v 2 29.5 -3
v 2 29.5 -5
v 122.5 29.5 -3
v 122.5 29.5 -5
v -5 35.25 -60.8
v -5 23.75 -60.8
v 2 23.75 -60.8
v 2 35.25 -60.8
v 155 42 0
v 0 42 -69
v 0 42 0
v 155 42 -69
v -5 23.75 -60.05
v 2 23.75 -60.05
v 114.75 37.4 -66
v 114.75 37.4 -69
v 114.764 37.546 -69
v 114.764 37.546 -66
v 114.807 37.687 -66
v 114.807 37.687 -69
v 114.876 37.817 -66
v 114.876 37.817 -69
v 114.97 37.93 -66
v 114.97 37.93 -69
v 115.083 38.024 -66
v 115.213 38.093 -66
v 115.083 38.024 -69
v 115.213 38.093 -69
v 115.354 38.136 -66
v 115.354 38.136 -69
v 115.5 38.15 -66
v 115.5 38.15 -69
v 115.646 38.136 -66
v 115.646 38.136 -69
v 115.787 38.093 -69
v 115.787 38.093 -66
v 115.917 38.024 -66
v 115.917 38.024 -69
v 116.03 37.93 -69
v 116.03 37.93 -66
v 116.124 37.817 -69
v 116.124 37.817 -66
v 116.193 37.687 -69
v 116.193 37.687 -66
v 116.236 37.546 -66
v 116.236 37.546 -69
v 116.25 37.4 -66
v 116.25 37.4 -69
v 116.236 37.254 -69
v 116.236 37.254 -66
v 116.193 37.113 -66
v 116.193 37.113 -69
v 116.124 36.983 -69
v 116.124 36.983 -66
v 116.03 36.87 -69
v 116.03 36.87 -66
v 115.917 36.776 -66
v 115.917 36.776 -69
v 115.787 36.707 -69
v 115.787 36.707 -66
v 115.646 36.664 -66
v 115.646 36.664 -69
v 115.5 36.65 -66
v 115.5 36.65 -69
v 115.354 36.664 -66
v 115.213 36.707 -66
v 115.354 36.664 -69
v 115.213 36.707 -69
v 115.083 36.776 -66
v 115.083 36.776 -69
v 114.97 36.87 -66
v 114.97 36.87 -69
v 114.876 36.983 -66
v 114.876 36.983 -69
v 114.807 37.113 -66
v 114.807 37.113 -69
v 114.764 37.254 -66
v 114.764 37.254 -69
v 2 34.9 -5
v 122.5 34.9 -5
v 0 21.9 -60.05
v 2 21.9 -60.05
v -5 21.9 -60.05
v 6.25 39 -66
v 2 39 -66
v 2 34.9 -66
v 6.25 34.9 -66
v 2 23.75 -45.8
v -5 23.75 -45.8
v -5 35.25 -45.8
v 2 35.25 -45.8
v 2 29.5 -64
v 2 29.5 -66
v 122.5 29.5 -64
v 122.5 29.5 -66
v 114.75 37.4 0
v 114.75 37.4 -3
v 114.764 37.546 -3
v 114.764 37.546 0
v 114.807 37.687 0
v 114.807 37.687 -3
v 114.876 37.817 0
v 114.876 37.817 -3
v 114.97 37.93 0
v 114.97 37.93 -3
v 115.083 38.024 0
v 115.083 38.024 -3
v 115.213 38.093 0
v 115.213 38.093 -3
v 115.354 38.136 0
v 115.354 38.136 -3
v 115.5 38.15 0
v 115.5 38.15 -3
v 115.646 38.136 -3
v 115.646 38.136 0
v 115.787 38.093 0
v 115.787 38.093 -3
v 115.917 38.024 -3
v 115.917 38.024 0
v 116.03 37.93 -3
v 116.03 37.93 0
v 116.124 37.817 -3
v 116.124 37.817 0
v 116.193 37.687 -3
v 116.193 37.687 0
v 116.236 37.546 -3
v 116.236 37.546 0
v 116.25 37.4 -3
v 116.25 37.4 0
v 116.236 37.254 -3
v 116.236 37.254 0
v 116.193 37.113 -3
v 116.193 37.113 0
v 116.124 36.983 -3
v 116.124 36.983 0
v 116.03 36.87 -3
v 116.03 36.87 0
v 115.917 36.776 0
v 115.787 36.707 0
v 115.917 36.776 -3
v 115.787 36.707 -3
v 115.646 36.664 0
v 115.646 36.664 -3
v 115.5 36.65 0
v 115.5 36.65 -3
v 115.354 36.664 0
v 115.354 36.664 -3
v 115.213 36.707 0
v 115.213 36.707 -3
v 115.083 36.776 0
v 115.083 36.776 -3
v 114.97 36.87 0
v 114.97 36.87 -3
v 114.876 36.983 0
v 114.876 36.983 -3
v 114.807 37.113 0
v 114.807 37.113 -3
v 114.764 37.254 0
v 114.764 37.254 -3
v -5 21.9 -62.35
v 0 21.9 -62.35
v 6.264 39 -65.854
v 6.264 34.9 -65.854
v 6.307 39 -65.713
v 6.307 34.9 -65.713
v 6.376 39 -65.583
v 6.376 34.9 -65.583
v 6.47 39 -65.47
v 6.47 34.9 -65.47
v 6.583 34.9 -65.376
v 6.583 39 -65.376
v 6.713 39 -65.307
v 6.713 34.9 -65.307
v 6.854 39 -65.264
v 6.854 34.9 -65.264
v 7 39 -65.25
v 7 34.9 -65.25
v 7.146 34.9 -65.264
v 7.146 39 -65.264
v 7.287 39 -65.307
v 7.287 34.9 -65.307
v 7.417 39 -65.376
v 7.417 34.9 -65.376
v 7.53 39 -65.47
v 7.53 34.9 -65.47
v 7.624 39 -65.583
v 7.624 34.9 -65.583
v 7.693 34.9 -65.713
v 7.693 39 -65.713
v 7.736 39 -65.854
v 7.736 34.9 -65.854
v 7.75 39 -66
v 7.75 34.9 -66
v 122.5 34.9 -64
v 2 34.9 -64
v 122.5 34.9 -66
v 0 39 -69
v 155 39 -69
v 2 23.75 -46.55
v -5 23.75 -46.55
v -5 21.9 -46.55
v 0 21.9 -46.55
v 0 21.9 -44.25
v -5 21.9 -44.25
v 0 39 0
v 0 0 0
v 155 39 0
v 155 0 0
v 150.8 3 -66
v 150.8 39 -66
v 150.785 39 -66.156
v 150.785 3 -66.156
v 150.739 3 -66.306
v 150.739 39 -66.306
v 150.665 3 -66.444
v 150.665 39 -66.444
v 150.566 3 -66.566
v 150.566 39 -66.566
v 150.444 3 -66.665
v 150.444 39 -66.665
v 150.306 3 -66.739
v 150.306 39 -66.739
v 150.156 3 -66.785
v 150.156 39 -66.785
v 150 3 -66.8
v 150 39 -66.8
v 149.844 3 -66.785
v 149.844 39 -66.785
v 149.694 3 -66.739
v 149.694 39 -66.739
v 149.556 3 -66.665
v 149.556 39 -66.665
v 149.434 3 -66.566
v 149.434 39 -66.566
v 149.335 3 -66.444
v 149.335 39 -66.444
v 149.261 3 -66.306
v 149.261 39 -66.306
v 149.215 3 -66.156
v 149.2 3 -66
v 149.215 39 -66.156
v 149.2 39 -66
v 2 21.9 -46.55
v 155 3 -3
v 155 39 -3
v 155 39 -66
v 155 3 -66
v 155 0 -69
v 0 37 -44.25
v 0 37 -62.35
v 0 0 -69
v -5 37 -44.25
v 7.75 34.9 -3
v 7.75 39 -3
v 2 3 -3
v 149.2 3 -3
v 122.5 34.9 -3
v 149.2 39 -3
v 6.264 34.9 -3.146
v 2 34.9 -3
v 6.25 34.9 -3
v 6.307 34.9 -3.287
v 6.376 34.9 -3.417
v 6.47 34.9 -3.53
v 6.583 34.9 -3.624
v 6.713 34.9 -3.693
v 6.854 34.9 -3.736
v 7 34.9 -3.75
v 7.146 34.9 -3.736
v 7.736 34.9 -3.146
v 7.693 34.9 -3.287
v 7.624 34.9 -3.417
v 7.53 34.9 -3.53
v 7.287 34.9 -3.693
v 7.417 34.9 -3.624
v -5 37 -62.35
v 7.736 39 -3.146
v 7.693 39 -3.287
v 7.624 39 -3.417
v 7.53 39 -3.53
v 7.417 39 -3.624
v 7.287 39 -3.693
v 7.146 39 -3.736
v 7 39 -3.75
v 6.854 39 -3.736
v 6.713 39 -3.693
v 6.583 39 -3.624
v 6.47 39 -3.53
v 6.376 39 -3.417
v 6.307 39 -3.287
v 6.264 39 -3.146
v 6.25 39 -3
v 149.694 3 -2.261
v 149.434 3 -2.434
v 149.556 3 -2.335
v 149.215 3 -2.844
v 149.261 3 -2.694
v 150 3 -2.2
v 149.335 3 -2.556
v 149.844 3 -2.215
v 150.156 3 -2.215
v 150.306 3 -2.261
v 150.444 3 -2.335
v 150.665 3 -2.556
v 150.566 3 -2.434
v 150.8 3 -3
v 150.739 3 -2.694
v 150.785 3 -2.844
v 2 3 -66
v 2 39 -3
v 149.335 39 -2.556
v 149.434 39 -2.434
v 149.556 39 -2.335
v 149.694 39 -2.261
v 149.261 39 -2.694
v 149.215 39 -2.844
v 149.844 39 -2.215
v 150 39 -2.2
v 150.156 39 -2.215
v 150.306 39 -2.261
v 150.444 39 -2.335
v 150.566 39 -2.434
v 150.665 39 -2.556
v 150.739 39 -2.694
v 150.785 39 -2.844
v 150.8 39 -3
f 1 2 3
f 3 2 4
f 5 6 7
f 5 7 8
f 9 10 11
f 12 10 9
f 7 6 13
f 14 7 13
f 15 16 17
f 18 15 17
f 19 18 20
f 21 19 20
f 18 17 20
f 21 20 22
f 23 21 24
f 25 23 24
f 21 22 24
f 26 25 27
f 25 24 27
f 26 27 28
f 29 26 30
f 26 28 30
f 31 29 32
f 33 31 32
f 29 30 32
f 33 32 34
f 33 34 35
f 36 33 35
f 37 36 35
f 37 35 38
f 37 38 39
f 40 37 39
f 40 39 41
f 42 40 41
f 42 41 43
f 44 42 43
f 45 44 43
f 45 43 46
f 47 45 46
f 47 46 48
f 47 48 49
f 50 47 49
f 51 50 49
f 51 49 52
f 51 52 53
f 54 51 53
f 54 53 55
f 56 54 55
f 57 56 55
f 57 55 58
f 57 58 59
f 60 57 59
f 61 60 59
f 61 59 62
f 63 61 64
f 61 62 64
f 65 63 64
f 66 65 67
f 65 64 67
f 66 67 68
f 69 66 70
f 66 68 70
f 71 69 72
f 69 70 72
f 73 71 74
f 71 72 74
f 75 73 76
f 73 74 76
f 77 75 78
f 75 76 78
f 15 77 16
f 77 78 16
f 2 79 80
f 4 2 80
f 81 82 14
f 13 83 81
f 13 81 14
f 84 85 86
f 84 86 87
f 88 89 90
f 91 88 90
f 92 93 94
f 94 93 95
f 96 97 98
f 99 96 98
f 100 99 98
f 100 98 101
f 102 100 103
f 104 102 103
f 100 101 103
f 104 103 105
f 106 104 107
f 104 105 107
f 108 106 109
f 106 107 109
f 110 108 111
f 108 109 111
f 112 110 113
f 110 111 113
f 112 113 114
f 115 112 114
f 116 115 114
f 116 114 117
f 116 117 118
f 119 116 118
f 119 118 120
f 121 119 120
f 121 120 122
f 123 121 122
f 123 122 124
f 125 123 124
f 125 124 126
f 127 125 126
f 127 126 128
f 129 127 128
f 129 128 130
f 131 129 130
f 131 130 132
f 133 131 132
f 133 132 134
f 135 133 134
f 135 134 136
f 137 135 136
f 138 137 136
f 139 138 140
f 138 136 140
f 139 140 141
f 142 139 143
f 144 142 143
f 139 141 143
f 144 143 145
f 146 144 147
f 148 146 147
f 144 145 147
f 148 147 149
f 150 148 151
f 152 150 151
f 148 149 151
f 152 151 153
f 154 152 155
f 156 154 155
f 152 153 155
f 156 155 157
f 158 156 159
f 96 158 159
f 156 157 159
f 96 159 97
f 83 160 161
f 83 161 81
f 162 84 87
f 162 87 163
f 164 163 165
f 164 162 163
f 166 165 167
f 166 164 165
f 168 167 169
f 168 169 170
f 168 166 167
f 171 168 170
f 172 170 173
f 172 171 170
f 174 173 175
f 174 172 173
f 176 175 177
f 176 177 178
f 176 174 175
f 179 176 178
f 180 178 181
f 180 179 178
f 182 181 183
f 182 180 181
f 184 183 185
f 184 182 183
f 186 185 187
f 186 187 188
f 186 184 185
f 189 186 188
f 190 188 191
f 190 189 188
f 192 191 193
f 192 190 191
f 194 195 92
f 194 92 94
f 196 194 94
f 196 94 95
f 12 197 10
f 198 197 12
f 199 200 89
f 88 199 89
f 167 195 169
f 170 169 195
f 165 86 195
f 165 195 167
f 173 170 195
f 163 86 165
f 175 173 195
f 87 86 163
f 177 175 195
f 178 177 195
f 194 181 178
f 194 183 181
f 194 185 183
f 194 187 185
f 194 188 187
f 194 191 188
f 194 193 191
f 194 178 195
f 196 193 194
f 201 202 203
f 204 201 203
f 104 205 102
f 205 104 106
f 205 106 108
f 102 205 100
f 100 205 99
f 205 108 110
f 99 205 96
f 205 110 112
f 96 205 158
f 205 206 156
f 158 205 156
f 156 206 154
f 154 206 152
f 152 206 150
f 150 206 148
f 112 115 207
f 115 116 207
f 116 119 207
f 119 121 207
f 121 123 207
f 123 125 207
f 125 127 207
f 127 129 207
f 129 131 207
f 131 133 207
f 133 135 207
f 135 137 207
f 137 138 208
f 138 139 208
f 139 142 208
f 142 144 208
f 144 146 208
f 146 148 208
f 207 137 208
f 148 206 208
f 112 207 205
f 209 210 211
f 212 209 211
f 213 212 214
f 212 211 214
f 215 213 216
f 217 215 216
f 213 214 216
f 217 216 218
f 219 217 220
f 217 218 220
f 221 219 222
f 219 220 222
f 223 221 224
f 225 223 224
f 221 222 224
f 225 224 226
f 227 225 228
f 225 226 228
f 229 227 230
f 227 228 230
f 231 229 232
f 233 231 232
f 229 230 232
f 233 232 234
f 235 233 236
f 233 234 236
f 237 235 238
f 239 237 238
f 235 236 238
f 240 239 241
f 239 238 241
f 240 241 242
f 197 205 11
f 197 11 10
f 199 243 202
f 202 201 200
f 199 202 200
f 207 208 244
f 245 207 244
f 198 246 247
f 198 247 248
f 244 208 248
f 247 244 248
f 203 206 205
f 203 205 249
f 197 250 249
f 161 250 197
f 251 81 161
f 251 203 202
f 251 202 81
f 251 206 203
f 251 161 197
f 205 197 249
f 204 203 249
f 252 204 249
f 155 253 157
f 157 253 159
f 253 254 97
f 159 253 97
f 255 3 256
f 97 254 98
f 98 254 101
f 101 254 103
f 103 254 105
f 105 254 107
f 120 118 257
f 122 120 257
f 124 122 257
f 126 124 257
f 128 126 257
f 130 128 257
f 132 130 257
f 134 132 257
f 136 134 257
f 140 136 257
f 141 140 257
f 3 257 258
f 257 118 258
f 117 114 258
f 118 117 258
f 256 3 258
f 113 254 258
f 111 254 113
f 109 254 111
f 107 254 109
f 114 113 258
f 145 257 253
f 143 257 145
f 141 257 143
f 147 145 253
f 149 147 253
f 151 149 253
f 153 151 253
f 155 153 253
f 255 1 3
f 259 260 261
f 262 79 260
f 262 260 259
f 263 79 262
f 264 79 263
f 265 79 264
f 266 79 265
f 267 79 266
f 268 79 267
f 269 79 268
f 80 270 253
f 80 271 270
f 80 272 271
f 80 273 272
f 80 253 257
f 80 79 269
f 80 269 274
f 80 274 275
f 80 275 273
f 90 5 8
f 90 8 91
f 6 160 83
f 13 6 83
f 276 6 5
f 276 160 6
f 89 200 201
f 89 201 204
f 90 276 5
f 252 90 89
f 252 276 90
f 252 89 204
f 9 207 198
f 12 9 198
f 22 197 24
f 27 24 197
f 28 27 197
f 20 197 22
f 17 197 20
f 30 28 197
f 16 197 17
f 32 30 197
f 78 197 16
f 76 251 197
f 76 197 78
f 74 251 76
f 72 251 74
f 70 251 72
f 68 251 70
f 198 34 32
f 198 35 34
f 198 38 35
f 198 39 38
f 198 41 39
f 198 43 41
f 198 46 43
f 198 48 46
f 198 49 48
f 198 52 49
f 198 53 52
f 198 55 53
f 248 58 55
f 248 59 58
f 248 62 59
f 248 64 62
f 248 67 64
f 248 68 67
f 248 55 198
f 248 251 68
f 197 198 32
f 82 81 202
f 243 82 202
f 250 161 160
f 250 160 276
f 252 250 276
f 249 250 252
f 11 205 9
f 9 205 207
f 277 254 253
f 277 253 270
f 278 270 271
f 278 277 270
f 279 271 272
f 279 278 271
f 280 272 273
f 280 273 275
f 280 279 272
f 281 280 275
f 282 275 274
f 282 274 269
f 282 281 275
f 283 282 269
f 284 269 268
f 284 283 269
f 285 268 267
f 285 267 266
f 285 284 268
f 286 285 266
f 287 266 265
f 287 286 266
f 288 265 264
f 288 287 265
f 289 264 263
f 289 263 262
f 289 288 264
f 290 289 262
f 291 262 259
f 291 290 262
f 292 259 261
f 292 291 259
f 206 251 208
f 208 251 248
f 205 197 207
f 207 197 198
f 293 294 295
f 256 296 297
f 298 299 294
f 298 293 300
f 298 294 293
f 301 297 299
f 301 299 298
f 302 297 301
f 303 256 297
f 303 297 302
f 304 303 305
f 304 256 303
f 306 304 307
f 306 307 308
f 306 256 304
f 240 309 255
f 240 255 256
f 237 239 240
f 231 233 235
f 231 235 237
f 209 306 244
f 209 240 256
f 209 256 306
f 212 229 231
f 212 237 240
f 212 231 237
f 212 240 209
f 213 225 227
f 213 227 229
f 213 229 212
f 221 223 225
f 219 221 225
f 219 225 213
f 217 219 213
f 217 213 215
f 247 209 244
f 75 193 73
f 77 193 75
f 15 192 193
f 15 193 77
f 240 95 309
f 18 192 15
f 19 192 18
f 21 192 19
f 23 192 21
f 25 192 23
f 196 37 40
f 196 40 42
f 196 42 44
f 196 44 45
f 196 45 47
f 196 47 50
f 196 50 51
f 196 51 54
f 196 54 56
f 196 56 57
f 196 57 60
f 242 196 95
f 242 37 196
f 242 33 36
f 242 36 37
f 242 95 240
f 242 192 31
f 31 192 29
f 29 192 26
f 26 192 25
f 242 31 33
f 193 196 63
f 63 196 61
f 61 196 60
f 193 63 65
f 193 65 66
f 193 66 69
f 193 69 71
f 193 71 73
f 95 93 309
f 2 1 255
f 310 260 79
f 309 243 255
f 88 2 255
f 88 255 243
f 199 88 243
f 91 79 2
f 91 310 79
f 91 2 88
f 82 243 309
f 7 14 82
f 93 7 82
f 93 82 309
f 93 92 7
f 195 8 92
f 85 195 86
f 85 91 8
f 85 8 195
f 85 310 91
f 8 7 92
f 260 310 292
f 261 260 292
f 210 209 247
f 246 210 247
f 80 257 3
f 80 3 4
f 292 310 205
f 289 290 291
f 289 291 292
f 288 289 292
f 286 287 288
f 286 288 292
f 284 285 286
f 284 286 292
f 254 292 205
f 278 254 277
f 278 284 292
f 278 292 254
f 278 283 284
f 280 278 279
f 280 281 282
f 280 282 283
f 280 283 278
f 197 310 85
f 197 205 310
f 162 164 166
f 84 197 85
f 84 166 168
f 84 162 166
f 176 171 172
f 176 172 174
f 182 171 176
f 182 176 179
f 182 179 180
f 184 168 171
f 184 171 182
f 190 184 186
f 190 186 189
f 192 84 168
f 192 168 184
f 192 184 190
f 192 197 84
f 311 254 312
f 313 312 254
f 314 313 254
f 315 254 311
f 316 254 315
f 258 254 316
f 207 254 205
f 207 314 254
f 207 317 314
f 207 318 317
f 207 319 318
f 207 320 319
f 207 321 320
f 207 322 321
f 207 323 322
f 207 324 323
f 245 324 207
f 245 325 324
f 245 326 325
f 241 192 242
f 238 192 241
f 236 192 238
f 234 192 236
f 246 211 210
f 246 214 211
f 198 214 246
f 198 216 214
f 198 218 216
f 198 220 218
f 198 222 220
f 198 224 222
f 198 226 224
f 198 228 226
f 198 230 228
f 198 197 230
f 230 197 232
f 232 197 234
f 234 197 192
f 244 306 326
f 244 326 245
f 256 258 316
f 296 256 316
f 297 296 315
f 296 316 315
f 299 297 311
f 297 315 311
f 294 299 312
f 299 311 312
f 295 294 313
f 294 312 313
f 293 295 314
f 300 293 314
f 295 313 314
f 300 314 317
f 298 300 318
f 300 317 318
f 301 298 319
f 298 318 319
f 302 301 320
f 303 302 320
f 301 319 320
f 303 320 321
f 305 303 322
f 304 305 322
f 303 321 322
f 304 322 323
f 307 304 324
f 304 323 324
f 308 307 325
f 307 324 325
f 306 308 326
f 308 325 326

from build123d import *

# Parameters (mm, degrees)
ESBO_O1_W                = 155
ESBO_O1_H                = 69
RESSALTO_EXTRUS_O1_DEPTH = 39
ESBO_O2_W                = 153
ESBO_O2_H                = 63
CORTE_EXTRUS_O1_DEPTH    = 36
RESSALTO_EXTRUS_O3_START = -4.1
ESBO_O5_W                = 120.5
ESBO_O5_H                = 2
RESSALTO_EXTRUS_O3_DEPTH = 5.4
ESBO_O7_R                = 0.8
CORTE_EXTRUS_O4_DEPTH    = 36
ESBO_O10_R               = 0.75
RESSALTO_EXTRUS_O5_DEPTH = 4.1
ESBO_O9_W                = 155
ESBO_O9_H                = 69
RESSALTO_EXTRUS_O4_DEPTH = 3
ESBO_O11_W               = 18.1
ESBO_O11_H               = 15.1
RESSALTO_EXTRUS_O6_DEPTH = 5
ESBO_O12_W               = 15
ESBO_O12_H               = 11.5
CORTE_EXTRUS_O5_DEPTH    = 9
ESBO_O14_W               = 13.5
ESBO_O14_H               = 1.85
CORTE_EXTRUS_O6_DEPTH    = 180.234483289
ESBO_O15_R               = 0.75
CORTE_EXTRUS_O7_DEPTH    = 175.785582929


with BuildPart() as part:
    # Esboço1 → Ressalto-extrusão1 (new body)
    with BuildSketch(Plane(origin=(0, 0, 0), x_dir=(1, 0, 0), z_dir=(0, 1, 0))):
        with Locations((77.5, 34.5)):
            Rectangle(ESBO_O1_W, ESBO_O1_H)
    extrude(amount=RESSALTO_EXTRUS_O1_DEPTH)

    # Esboço2 → Corte-extrusão1 (cut)
    with BuildSketch(Plane(origin=(0, 39, 0), x_dir=(1, 0, 0), z_dir=(0, 1, 0))):
        with Locations((78.5, 34.5)):
            Rectangle(ESBO_O2_W, ESBO_O2_H)
    extrude(amount=-CORTE_EXTRUS_O1_DEPTH, mode=Mode.SUBTRACT)

    # Esboço5 → Ressalto-extrusão3 (add)
    with BuildSketch(Plane(origin=(0, 39, 0), x_dir=(1, 0, 0), z_dir=(0, 1, 0)).offset(RESSALTO_EXTRUS_O3_START)):
        with Locations((62.25, 4)):
            Rectangle(ESBO_O5_W, ESBO_O5_H)
        with Locations((62.25, 65)):
            Rectangle(ESBO_O5_W, ESBO_O5_H)
    extrude(amount=-RESSALTO_EXTRUS_O3_DEPTH)

    # Esboço7 → Corte-extrusão4 (cut)
    with BuildSketch(Plane(origin=(0, 39, 0), x_dir=(1, 0, 0), z_dir=(0, 1, 0))):
        with Locations((150, 3)):
            Circle(ESBO_O7_R)
        with Locations((150, 66)):
            Circle(ESBO_O7_R)
    extrude(amount=-CORTE_EXTRUS_O4_DEPTH, mode=Mode.SUBTRACT)

    # Esboço10 → Ressalto-extrusão5 (add)
    with BuildSketch(Plane(origin=(0, 39, 0), x_dir=(1, 0, 0), z_dir=(0, 1, 0))):
        with Locations((7, 3)):
            Circle(ESBO_O10_R)
        with Locations((7, 66)):
            Circle(ESBO_O10_R)
    extrude(amount=-RESSALTO_EXTRUS_O5_DEPTH)

    # Esboço11 → Ressalto-extrusão6 (add)
    with BuildSketch(Plane.ZY):
        with Locations((-53.3, 29.45)):
            Rectangle(ESBO_O11_W, ESBO_O11_H)
    extrude(amount=RESSALTO_EXTRUS_O6_DEPTH)

    # Esboço12 → Corte-extrusão5 (cut)
    with BuildSketch(Plane.ZY.offset(5)):
        with Locations((-53.3, 29.5)):
            Rectangle(ESBO_O12_W, ESBO_O12_H)
    extrude(amount=-CORTE_EXTRUS_O5_DEPTH, mode=Mode.SUBTRACT)

    # Esboço14 → Corte-extrusão6 (cut, through all)
    with BuildSketch(Plane.ZY.offset(5)):
        with Locations((-53.3, 22.825)):
            Rectangle(ESBO_O14_W, ESBO_O14_H)
    extrude(amount=-CORTE_EXTRUS_O6_DEPTH, mode=Mode.SUBTRACT)

    # Esboço15 → Corte-extrusão7 (cut, through all)
    with BuildSketch(Plane(origin=(0, 0, -69), x_dir=(-1, 0, 0), z_dir=(0, 0, -1))):
        with Locations((-115.5, 37.4)):
            Circle(ESBO_O15_R)
    extrude(amount=-CORTE_EXTRUS_O7_DEPTH, mode=Mode.SUBTRACT)


with BuildPart() as body_2:
    # Esboço9 → Ressalto-extrusão4 (new body)
    with BuildSketch(Plane(origin=(0, 39, 0), x_dir=(1, 0, 0), z_dir=(0, 1, 0))):
        with Locations((77.5, 34.5)):
            Rectangle(ESBO_O9_W, ESBO_O9_H)
    extrude(amount=RESSALTO_EXTRUS_O4_DEPTH)


solid = Compound([part.part, body_2.part])
